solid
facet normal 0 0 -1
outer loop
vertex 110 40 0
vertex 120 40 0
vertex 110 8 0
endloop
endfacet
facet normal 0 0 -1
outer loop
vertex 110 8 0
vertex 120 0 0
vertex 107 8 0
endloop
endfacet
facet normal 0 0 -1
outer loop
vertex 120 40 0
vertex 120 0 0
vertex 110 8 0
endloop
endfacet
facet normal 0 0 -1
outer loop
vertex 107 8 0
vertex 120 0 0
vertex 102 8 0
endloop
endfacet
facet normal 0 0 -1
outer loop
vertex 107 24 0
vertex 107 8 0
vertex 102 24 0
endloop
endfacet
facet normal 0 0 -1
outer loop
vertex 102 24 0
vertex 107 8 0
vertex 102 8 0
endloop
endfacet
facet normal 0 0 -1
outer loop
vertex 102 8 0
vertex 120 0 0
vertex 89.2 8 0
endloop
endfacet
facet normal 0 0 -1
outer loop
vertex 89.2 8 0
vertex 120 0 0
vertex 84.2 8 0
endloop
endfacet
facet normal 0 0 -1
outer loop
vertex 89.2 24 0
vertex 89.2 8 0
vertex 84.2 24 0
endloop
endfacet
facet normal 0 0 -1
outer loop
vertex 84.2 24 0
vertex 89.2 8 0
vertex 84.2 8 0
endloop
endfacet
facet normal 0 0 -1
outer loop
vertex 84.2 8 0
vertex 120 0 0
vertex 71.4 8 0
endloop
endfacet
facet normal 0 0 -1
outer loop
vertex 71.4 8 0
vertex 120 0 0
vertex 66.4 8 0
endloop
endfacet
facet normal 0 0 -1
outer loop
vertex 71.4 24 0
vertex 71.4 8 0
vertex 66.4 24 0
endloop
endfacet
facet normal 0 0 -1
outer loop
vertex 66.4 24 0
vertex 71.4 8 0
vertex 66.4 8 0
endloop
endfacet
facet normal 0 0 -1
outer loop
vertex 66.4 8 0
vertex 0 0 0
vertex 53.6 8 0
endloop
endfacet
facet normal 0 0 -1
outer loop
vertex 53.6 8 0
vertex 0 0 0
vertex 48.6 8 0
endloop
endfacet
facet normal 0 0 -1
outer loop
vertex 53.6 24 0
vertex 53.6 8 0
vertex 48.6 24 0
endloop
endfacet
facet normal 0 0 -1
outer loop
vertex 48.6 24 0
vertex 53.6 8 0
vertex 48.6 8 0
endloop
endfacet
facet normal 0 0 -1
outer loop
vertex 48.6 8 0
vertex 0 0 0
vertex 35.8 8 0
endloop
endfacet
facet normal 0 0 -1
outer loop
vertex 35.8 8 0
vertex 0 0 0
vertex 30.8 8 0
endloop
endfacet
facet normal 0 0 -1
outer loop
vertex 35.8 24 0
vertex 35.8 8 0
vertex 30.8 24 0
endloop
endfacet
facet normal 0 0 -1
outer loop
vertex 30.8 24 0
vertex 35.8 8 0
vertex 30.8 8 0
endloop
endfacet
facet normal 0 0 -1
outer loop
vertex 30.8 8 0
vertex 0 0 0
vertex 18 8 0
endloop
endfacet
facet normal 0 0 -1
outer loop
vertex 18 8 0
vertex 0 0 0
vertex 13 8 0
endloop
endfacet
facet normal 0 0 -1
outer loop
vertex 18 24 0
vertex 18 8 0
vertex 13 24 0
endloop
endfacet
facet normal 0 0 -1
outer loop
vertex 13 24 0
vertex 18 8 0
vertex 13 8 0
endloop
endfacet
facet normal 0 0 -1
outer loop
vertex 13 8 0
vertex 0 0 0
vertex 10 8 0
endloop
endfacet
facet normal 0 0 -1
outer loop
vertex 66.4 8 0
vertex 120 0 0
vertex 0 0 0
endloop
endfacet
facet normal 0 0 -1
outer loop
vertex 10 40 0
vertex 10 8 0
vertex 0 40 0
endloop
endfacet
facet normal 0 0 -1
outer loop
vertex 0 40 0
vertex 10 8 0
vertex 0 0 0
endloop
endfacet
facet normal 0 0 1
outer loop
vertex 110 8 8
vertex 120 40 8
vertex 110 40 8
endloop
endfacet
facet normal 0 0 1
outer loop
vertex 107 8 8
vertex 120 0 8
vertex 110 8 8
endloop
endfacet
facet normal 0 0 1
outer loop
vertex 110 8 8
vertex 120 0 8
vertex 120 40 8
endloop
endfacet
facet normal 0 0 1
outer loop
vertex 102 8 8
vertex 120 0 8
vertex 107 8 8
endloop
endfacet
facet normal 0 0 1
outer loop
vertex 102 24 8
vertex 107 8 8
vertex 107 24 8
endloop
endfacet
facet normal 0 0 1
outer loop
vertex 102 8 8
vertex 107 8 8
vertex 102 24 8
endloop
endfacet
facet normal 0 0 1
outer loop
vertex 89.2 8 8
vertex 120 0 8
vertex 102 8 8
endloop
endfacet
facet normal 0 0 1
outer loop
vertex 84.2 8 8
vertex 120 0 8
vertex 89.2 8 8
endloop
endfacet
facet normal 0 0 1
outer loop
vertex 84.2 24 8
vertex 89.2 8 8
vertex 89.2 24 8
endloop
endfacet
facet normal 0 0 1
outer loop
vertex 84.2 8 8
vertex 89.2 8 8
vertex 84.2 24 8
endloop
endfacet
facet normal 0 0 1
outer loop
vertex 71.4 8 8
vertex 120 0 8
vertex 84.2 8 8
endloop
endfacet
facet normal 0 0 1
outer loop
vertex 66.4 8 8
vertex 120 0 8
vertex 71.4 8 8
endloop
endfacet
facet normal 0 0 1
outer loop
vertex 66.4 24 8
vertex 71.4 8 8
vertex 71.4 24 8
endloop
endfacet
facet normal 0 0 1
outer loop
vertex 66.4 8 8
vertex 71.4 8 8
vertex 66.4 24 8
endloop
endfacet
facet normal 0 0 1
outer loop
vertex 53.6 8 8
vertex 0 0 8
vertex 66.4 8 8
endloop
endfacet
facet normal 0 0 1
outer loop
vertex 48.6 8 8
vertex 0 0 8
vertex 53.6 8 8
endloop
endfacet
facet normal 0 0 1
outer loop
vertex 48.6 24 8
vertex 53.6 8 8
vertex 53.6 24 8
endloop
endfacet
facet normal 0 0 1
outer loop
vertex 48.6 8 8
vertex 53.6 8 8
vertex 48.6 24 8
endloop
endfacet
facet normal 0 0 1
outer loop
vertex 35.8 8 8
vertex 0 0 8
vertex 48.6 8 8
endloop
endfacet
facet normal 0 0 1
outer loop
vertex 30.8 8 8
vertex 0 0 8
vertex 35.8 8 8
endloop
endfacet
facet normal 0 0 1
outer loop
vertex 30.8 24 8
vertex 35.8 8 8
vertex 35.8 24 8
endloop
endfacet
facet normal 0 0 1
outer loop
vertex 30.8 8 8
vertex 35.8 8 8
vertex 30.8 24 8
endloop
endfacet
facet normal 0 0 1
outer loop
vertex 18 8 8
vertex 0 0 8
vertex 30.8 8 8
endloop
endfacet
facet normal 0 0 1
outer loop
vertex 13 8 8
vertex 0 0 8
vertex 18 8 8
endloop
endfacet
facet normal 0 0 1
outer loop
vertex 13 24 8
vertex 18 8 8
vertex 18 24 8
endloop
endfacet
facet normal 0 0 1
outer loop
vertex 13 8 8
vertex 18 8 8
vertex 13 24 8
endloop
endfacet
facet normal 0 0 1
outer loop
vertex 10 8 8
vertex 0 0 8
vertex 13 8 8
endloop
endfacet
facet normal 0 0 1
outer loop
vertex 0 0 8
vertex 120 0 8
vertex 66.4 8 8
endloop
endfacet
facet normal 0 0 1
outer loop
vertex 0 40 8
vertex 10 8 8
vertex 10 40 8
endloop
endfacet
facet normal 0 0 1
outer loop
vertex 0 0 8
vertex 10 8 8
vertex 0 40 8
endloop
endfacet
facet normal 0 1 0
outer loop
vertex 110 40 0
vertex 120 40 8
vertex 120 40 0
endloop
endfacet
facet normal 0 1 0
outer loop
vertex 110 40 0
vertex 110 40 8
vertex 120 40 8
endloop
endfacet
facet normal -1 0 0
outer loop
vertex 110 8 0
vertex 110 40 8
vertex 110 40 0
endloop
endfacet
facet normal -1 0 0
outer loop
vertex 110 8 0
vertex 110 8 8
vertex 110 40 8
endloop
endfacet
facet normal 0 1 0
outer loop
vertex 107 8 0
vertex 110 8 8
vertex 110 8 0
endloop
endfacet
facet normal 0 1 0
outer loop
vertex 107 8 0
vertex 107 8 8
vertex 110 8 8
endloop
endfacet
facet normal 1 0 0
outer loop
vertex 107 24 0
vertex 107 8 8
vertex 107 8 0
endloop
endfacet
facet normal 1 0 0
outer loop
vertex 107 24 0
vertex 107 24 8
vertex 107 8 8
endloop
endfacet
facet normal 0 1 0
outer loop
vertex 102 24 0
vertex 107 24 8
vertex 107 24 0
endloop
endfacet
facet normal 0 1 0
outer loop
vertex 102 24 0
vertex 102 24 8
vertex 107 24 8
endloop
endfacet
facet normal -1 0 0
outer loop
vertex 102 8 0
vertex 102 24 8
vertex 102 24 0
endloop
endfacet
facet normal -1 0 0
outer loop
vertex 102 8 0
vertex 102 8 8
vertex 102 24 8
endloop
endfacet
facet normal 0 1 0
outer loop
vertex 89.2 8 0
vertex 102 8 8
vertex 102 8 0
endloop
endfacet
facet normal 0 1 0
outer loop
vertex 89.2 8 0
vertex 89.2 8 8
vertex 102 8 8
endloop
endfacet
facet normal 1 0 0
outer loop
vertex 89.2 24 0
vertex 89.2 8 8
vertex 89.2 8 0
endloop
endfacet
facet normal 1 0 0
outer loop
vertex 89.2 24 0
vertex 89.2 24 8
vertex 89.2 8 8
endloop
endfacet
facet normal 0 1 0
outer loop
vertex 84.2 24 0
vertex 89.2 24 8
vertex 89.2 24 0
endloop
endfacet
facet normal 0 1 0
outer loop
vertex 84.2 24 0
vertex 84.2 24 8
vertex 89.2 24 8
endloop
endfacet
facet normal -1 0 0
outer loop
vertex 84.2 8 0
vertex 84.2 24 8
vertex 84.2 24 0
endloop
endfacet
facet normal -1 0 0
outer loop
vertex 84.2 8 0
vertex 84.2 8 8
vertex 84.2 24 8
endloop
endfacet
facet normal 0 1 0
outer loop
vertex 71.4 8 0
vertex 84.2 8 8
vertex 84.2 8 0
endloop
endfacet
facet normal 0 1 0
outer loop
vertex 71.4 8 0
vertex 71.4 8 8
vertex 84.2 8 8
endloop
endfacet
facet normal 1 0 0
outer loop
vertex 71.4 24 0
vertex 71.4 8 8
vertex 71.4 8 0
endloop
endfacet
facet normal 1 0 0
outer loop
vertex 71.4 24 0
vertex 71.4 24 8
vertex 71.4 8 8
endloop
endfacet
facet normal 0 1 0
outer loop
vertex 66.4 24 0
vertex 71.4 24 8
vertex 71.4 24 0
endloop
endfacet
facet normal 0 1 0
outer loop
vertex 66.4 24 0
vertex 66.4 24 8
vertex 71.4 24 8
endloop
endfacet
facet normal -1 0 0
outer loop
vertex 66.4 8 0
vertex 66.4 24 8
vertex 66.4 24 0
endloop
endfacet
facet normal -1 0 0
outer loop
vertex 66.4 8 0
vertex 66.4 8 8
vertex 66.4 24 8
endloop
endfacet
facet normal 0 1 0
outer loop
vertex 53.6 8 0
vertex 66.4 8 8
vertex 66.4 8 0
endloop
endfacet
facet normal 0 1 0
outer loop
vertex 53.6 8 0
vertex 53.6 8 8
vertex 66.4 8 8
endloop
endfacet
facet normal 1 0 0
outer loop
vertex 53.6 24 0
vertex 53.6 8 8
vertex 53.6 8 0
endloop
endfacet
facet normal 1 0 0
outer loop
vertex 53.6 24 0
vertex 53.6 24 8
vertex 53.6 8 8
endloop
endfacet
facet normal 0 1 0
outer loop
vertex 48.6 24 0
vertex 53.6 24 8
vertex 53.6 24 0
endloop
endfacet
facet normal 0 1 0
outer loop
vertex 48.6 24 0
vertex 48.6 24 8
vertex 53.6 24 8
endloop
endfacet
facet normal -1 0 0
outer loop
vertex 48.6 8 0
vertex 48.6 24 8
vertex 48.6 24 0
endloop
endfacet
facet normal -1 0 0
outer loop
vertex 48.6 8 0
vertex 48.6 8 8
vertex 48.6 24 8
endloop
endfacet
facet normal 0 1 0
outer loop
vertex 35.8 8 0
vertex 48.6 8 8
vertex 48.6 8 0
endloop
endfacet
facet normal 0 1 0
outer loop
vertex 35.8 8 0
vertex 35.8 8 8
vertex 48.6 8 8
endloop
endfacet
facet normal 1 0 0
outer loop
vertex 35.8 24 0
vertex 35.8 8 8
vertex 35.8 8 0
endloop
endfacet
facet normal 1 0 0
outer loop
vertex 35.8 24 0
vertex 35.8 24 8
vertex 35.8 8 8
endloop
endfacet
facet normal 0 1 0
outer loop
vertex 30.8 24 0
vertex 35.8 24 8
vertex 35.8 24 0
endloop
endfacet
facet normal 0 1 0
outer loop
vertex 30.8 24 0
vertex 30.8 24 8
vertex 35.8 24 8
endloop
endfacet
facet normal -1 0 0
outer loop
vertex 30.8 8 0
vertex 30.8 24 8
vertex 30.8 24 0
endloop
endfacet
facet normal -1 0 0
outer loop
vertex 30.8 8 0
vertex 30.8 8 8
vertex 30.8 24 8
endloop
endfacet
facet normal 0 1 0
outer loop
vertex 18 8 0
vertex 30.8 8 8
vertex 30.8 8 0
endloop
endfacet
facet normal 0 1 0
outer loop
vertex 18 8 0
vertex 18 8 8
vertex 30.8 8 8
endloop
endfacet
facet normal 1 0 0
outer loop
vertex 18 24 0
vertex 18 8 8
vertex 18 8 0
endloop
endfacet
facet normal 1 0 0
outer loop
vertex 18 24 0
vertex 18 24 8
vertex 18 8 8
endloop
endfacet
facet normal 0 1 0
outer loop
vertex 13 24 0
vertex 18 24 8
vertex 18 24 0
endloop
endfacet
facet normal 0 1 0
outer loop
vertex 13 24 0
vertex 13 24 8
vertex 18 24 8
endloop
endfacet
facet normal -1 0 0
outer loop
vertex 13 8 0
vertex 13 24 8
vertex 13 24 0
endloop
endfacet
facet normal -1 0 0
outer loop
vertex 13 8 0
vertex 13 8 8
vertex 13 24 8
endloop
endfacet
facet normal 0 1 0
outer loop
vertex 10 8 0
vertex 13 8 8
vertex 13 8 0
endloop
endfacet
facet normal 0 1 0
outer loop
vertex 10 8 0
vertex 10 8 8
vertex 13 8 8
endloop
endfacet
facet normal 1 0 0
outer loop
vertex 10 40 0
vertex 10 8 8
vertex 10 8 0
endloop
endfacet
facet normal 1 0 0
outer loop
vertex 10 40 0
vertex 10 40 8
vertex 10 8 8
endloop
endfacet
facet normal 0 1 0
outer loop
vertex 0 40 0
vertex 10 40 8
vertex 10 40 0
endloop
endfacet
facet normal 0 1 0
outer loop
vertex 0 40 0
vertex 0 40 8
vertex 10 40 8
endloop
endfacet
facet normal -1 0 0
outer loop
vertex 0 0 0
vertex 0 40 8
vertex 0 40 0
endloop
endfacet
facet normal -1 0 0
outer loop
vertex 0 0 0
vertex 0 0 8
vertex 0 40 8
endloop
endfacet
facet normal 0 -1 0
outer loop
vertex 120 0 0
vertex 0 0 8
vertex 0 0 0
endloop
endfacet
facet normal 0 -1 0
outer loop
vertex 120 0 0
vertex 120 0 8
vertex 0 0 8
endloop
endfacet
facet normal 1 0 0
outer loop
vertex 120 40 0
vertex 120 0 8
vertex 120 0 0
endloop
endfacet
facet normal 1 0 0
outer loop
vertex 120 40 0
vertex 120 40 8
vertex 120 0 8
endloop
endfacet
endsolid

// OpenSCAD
$fn = 32;

// ----------------------------------------------------------------------
// Guard grille: 6 slats over a 120 x 40 mm plate
// ----------------------------------------------------------------------

// --- parameters (mm) ---
profile_height = 8;       // extrusion height
profile_points = 32;      // points of the closed outline

profile = [[0, 0], [120, 0], [120, 40], [110, 40], [110, 8], [107, 8], [107, 24], [102, 24], [102, 8], [89.2, 8], [89.2, 24], [84.2, 24], [84.2, 8], [71.4, 8], [71.4, 24], [66.4, 24], [66.4, 8], [53.6, 8], [53.6, 24], [48.6, 24], [48.6, 8], [35.8, 8], [35.8, 24], [30.8, 24], [30.8, 8], [18, 8], [18, 24], [13, 24], [13, 8], [10, 8], [10, 40], [0, 40]];  // single closed polygon, 32 points, counter clockwise

// --- the one profile operation ---
linear_extrude(height = profile_height) polygon(points = profile);
